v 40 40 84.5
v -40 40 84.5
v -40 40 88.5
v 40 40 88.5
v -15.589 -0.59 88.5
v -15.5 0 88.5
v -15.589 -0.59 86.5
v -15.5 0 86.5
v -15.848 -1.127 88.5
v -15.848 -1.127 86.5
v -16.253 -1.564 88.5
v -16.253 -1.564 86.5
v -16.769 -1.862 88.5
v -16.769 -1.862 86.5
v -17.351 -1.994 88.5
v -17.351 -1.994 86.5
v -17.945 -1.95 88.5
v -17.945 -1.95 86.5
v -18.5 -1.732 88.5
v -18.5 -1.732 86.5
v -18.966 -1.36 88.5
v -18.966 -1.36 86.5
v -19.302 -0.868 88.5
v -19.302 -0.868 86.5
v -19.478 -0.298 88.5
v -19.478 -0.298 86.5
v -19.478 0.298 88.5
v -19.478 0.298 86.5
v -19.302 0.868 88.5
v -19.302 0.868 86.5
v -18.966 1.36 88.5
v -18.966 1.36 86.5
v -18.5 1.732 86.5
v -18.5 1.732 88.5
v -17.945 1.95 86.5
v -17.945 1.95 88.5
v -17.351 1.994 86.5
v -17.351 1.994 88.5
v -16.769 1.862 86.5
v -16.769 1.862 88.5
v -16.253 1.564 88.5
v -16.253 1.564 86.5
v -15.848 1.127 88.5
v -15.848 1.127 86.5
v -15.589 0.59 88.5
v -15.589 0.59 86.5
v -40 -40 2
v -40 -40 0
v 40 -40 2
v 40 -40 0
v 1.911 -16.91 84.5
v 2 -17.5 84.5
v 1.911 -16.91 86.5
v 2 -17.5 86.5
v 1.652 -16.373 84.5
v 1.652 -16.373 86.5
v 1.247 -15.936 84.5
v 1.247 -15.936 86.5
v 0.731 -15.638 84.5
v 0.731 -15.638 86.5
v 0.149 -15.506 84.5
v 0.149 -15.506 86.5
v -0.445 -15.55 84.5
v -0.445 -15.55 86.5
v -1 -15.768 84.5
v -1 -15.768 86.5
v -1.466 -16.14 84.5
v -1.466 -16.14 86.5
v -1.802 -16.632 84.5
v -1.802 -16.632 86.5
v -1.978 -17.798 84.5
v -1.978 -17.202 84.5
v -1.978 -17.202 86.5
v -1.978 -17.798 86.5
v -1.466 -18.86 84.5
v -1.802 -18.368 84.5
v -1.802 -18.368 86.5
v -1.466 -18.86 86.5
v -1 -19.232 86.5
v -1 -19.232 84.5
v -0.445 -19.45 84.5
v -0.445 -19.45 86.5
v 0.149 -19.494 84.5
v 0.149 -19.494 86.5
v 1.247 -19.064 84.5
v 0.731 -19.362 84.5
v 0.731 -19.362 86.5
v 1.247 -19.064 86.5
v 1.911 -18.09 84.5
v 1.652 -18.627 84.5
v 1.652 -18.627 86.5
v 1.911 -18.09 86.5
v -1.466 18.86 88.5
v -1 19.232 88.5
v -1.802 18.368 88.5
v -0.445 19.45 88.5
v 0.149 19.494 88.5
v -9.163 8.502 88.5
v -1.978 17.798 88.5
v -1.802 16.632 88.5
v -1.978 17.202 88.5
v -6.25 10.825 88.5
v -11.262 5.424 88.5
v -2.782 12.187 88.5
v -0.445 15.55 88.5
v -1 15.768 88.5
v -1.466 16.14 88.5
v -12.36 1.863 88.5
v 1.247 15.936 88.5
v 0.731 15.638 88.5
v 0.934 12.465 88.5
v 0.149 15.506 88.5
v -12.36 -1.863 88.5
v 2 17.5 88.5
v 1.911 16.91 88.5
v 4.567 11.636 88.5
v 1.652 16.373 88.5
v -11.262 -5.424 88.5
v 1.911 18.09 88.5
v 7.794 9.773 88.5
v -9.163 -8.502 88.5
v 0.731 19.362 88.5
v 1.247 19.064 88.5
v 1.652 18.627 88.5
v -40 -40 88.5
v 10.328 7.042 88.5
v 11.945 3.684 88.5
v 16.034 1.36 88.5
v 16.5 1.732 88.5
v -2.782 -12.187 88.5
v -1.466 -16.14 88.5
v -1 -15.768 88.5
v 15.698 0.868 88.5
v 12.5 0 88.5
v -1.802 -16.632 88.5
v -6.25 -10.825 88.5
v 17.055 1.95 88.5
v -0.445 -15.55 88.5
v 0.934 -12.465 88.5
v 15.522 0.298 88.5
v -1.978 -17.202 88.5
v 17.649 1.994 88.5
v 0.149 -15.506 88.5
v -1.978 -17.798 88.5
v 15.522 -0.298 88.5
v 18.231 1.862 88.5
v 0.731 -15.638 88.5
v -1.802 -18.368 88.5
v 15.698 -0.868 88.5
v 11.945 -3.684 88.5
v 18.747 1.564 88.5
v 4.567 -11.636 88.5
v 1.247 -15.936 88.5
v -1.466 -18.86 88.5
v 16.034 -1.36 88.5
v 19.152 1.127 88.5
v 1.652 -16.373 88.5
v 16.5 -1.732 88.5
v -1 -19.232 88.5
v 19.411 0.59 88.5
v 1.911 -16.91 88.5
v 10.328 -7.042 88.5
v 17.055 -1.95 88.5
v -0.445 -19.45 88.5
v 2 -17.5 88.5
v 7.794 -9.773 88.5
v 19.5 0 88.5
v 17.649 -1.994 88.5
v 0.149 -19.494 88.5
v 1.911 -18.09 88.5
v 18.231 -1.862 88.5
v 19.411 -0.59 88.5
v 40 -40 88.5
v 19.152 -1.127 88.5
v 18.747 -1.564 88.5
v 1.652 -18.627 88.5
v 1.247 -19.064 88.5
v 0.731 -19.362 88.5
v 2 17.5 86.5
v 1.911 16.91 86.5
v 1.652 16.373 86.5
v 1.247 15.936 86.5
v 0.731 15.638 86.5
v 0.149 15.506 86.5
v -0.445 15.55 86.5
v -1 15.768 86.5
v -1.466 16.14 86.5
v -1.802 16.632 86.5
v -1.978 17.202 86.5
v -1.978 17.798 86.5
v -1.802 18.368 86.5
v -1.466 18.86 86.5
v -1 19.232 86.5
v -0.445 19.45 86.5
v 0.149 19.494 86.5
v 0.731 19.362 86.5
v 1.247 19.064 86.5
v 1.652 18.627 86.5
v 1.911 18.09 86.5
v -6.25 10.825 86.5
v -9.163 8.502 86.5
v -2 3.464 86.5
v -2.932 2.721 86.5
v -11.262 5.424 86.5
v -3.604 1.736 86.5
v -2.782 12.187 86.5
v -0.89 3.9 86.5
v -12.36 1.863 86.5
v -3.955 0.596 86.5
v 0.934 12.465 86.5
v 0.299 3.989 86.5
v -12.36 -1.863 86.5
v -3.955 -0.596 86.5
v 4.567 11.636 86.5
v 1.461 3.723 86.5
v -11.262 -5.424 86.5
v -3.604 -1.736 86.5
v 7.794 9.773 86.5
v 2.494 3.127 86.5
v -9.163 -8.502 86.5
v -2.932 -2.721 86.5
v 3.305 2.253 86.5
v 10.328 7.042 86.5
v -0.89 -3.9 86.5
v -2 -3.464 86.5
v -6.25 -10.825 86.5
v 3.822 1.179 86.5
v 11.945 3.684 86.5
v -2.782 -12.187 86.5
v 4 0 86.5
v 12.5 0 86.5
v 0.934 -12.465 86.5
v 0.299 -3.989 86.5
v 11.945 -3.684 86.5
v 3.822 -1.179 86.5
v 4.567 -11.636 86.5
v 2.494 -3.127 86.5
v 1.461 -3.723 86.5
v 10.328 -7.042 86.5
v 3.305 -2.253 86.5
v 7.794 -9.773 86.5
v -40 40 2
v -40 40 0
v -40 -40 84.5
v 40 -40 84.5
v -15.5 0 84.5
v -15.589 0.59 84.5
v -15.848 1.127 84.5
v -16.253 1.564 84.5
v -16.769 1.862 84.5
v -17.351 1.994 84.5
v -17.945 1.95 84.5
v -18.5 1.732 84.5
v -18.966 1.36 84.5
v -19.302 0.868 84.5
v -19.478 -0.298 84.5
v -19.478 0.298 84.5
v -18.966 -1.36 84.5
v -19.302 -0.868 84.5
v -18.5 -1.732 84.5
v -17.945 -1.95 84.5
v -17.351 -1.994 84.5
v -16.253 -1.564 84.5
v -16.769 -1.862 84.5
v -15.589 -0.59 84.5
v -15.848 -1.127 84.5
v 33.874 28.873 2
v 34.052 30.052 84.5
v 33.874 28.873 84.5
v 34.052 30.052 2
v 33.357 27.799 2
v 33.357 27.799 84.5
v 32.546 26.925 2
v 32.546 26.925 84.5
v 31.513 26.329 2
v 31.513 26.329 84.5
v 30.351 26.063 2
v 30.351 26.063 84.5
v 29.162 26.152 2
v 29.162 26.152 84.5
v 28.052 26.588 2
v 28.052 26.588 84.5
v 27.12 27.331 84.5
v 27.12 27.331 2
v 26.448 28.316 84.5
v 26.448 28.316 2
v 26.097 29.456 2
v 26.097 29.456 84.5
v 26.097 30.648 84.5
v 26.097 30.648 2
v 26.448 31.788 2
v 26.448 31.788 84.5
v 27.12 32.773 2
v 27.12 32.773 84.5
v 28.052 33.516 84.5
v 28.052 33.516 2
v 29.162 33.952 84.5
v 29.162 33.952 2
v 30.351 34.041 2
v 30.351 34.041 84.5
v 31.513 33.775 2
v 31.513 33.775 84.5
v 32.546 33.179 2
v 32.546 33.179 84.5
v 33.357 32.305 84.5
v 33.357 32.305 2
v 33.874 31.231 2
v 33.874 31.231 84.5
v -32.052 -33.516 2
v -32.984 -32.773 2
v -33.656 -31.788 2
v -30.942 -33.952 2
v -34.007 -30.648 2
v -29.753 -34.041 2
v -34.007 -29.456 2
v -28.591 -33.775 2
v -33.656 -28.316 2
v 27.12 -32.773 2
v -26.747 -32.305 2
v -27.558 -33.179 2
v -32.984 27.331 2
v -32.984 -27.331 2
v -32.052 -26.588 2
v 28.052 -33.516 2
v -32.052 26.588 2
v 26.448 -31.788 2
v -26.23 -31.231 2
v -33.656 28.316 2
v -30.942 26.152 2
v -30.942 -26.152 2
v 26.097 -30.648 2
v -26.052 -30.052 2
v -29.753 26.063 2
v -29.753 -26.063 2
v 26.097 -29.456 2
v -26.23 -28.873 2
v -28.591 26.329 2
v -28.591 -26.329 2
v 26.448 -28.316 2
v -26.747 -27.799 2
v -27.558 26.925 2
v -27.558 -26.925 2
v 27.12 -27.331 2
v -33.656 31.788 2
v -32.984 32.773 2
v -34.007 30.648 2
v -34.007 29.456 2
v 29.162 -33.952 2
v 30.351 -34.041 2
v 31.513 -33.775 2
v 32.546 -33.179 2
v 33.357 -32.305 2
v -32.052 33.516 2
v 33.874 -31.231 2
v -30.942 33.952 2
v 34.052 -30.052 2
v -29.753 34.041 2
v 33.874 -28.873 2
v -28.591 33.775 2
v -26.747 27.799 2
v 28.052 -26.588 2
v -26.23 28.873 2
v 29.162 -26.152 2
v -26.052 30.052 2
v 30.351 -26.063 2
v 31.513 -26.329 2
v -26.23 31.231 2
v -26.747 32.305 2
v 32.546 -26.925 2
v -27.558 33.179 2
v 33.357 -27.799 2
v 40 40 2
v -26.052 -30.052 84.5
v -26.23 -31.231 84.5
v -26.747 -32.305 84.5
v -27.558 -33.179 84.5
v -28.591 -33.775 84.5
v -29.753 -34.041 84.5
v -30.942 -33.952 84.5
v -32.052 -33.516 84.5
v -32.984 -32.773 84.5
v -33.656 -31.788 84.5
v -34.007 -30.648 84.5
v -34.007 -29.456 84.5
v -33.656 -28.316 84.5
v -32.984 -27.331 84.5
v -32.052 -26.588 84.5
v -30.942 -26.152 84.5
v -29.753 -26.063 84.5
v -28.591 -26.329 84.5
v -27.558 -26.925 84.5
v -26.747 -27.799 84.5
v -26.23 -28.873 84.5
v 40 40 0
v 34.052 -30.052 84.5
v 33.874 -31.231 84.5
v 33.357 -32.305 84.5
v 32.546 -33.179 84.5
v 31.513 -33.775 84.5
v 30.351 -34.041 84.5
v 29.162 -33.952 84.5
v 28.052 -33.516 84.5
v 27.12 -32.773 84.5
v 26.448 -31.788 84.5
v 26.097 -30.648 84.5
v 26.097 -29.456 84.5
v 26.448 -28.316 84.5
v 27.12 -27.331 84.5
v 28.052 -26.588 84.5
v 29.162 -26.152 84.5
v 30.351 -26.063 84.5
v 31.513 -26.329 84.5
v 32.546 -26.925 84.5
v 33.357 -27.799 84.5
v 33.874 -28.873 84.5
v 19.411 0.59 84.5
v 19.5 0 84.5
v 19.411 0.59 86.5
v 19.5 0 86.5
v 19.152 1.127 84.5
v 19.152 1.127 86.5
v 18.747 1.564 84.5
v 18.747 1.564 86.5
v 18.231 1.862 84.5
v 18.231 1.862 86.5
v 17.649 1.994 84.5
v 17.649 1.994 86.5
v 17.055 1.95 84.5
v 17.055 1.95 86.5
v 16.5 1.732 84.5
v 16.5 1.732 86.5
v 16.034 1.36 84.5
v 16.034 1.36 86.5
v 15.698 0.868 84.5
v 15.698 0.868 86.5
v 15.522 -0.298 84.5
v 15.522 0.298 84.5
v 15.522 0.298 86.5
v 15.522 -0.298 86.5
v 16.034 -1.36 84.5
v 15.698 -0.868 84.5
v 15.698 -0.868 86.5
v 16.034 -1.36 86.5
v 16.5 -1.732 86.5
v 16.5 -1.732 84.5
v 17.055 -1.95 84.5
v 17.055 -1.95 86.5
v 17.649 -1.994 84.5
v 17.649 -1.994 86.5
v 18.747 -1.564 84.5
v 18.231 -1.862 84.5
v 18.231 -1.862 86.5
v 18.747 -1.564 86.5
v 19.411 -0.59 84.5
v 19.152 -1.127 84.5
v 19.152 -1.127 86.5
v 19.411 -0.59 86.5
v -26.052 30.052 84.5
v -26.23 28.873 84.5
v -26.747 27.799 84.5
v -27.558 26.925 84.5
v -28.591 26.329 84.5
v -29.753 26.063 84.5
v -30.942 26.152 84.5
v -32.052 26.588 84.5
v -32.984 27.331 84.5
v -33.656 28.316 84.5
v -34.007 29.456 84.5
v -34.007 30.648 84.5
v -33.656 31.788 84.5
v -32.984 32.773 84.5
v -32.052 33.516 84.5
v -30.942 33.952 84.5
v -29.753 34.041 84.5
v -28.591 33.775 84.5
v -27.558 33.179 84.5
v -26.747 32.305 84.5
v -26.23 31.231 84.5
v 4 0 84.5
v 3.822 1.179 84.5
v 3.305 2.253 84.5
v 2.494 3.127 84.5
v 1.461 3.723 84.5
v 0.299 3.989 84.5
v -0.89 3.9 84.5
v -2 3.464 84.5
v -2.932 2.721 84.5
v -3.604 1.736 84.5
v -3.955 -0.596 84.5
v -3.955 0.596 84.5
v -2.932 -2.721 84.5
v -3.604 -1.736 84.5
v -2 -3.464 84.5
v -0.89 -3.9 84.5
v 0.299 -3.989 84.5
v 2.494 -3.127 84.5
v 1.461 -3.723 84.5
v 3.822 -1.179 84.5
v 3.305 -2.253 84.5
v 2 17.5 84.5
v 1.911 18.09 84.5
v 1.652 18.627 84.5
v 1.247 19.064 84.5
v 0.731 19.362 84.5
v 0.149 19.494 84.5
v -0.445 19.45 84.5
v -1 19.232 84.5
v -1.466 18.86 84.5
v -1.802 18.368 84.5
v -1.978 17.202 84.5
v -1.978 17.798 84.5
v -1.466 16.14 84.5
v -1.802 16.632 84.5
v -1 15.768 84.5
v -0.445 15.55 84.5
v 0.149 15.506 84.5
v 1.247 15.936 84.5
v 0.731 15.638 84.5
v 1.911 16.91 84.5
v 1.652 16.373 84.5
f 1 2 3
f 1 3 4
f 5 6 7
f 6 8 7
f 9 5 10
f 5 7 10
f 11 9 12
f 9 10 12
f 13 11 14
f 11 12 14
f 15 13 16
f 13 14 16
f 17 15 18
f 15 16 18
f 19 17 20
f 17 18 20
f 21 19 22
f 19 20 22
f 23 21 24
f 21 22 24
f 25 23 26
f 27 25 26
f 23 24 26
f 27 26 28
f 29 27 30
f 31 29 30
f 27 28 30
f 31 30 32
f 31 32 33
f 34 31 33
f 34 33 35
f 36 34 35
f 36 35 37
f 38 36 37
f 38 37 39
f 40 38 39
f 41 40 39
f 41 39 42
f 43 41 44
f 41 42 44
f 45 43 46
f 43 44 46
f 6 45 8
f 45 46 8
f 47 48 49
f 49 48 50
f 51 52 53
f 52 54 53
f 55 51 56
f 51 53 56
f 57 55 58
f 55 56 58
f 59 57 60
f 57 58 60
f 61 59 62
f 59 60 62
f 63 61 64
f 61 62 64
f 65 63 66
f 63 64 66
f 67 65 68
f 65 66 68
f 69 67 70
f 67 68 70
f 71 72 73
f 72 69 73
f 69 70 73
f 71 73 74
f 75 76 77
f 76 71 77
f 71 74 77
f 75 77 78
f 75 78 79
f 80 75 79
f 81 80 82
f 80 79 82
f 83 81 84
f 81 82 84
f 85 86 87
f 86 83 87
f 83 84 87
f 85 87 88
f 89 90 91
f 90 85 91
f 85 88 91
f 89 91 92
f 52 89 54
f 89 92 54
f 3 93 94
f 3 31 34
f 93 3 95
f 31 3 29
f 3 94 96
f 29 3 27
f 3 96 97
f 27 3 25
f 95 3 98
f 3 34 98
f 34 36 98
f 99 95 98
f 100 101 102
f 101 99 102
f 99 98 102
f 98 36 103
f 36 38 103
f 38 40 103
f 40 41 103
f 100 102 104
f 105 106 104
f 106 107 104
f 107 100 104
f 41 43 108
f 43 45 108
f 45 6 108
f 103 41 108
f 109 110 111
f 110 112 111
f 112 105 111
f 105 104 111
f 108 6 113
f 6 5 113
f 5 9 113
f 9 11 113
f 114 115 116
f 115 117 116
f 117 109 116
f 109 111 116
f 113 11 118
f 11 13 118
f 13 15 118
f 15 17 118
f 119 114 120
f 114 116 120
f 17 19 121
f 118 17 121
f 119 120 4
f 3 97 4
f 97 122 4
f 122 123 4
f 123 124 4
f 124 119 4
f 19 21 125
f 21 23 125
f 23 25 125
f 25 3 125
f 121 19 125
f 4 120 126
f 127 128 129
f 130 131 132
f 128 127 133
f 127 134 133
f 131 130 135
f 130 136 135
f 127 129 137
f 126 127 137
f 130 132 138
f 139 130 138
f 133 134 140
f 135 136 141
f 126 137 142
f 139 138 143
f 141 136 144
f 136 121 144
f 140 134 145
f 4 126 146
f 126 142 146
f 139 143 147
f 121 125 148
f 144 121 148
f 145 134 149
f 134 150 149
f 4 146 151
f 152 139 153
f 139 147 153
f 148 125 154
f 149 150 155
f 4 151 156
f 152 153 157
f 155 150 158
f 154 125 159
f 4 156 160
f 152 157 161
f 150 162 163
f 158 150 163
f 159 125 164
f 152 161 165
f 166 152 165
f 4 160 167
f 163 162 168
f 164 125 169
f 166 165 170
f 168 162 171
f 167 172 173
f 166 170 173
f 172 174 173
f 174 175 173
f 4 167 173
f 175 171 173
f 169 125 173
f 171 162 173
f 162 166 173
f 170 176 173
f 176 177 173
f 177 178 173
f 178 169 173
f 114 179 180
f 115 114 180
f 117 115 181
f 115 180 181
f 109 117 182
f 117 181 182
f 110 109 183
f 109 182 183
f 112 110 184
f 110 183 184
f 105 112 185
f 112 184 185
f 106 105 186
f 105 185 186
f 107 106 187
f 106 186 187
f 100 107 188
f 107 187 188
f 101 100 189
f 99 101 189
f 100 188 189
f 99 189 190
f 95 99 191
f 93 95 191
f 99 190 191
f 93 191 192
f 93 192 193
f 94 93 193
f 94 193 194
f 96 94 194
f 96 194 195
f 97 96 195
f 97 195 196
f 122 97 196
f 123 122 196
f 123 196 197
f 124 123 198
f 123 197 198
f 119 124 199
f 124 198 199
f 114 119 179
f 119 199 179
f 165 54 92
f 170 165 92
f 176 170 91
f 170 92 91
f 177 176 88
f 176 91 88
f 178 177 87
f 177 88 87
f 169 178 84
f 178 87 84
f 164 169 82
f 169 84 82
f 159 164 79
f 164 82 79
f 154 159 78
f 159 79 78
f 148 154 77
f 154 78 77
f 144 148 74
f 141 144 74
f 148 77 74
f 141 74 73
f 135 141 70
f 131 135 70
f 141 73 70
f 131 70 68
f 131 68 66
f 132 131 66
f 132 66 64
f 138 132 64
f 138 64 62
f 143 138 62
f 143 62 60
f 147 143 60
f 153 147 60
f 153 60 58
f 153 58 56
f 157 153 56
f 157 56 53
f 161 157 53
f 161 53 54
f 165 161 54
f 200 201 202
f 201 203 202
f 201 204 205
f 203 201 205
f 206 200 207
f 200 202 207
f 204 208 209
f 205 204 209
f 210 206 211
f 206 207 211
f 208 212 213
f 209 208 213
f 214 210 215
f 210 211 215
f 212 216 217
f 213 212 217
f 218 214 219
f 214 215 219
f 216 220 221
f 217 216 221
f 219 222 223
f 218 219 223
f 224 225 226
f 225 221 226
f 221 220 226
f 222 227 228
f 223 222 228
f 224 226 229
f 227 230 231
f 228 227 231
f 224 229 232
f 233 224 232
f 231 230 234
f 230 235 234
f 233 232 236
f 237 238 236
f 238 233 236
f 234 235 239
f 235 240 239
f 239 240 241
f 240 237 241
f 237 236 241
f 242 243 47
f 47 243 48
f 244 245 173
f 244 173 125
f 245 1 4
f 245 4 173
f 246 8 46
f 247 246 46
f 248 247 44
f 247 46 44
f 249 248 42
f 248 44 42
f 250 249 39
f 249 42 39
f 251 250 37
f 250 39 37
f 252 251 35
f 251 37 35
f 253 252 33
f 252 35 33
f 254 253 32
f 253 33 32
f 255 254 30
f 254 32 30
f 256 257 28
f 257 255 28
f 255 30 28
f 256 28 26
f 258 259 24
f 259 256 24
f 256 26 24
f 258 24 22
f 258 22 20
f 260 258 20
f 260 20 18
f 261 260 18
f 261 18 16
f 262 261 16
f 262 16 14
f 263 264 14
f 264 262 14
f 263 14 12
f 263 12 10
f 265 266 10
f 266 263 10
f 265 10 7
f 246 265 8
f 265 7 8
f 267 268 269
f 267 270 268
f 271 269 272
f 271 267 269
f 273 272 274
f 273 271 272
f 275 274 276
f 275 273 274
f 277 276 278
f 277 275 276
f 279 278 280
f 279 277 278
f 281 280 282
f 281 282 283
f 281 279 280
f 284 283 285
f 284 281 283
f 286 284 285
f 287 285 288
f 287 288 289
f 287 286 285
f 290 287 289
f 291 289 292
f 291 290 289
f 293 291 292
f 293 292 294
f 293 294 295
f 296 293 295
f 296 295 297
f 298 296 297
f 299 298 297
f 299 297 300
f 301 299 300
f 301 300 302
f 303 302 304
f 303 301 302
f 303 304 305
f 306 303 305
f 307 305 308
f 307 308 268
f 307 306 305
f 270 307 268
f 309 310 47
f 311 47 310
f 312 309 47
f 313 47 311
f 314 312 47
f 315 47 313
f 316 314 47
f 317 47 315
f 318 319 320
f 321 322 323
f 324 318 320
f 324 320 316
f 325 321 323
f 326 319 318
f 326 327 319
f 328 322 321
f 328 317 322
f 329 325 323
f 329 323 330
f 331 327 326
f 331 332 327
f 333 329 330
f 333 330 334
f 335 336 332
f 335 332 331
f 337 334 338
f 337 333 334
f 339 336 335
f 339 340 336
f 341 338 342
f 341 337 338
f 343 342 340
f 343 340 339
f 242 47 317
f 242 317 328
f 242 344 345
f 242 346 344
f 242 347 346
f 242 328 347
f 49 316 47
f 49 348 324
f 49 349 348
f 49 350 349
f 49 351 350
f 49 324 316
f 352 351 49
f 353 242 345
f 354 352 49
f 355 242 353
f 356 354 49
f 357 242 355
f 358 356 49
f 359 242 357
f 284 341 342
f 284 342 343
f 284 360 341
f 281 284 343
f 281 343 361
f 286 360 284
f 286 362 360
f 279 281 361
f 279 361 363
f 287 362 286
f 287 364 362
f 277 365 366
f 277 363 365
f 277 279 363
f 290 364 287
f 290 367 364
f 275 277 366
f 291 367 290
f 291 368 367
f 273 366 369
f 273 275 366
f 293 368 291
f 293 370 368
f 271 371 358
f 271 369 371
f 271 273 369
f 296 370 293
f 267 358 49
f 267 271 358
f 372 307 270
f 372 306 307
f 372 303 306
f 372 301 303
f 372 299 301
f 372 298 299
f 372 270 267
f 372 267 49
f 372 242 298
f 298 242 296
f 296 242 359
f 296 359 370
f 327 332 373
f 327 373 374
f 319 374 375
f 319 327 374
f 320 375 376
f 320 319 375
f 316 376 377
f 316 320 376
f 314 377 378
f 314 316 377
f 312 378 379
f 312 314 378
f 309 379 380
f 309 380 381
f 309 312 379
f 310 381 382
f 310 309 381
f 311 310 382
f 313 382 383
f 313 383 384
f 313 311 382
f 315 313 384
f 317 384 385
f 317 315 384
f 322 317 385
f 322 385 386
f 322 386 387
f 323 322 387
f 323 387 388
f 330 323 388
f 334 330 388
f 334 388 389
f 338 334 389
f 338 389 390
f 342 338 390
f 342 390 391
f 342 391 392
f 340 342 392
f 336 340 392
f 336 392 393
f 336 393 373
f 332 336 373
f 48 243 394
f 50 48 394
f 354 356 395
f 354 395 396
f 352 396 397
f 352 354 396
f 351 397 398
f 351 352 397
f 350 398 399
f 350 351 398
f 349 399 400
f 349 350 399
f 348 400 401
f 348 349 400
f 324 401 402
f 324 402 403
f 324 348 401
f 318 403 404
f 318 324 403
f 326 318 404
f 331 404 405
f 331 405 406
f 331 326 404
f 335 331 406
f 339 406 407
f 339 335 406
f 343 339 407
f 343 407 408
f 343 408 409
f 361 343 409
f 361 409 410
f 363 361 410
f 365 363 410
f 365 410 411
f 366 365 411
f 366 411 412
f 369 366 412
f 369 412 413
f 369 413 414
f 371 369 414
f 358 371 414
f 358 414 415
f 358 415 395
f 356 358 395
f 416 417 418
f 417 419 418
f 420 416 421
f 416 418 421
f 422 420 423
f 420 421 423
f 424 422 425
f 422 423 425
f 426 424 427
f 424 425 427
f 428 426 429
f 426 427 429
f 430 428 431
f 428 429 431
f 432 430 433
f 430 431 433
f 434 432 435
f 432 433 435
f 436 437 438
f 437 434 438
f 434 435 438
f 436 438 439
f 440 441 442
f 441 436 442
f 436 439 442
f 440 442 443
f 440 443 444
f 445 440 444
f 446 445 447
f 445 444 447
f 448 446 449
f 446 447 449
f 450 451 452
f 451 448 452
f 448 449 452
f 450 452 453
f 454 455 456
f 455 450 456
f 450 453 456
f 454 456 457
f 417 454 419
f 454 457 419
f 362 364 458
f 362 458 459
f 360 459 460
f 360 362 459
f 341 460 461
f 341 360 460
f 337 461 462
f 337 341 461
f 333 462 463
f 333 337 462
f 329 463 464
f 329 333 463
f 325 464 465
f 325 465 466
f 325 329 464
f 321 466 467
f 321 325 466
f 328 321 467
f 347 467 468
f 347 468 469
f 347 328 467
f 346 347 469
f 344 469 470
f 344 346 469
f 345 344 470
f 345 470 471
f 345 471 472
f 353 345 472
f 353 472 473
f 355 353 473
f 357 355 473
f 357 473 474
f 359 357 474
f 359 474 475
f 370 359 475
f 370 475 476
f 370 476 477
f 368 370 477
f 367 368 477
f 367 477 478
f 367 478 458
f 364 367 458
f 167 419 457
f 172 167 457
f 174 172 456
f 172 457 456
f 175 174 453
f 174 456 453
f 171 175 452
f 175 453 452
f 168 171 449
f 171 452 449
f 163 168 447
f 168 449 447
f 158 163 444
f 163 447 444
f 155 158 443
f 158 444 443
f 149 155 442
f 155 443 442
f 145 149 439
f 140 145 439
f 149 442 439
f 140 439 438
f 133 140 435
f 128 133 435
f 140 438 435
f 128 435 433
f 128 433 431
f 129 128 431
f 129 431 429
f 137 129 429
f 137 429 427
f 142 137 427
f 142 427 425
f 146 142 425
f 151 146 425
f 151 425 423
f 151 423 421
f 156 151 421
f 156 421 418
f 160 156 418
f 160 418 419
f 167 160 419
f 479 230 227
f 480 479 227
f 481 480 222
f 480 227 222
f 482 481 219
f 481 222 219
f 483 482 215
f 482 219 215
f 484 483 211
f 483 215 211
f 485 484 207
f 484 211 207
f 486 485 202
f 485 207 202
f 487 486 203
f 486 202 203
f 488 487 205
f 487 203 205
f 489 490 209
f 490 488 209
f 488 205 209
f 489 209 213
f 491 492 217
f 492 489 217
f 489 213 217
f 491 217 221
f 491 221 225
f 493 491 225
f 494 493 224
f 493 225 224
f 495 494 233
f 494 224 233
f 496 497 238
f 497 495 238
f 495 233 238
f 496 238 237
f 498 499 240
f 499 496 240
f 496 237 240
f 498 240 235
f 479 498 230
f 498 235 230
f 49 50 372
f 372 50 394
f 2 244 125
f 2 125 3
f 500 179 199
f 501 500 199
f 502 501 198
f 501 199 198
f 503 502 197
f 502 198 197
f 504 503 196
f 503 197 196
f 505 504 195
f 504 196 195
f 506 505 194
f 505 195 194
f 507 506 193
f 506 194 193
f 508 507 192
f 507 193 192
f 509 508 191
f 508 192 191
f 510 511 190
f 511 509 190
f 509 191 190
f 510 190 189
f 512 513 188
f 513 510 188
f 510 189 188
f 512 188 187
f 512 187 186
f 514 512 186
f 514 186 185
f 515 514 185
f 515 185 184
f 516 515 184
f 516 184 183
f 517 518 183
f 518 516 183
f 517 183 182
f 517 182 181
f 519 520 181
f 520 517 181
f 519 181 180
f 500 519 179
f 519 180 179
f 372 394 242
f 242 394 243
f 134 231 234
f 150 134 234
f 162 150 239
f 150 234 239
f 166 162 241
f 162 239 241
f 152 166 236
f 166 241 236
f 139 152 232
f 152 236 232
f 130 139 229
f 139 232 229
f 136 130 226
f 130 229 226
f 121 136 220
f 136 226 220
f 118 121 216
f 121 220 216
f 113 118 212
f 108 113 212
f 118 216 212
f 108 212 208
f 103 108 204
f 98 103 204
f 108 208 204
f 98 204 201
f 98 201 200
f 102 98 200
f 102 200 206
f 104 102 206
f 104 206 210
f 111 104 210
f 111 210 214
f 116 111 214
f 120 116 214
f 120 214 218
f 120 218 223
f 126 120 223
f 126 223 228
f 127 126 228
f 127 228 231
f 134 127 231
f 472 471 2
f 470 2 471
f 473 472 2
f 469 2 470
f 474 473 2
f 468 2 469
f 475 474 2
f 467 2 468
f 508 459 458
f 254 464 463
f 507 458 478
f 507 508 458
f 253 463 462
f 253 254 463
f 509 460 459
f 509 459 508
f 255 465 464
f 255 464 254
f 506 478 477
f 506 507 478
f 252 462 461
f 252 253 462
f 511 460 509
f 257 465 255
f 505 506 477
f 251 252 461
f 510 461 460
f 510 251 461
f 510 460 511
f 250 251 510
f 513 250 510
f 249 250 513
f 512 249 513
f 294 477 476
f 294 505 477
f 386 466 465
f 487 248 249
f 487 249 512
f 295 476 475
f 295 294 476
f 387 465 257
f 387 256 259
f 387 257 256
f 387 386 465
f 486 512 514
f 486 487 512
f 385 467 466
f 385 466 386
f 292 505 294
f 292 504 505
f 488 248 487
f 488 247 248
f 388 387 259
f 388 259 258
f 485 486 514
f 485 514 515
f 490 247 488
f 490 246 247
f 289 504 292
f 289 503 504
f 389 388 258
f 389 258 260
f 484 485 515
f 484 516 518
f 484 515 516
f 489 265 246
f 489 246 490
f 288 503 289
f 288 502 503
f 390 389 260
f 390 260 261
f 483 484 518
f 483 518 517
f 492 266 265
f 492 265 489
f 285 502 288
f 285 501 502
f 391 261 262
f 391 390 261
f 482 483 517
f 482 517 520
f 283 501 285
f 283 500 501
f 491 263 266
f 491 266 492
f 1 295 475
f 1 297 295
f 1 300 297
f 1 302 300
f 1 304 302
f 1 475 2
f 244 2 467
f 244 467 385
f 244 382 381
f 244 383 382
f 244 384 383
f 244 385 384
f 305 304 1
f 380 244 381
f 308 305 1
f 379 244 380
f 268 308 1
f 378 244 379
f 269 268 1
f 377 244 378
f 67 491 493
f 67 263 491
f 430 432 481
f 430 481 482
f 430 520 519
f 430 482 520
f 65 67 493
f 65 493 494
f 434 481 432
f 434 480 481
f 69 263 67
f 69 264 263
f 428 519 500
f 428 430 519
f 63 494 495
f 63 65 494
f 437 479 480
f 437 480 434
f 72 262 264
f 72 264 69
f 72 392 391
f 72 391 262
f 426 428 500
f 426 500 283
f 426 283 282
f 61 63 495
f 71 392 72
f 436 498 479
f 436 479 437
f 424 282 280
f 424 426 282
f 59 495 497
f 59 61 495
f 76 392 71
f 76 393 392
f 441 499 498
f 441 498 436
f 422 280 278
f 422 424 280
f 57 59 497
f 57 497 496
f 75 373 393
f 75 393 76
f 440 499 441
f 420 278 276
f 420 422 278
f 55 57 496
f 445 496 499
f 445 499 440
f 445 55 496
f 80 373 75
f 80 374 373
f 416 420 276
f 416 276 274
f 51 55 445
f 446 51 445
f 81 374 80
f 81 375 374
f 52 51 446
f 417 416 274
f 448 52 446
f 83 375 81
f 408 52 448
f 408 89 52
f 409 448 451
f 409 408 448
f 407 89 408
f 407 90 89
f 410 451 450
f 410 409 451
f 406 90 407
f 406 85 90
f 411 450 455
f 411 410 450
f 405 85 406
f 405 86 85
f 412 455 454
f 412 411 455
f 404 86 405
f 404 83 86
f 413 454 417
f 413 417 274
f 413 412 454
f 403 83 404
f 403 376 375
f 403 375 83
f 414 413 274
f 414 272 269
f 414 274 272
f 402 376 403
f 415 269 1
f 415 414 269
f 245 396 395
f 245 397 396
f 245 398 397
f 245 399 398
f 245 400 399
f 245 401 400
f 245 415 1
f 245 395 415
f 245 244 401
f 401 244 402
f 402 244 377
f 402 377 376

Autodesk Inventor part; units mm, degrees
ref_plane "YZ Plane" through (0, 0, 0) normal (1, 0, 0) x (0, 1, 0)
ref_plane "XZ Plane" through (0, 0, 0) normal (0, 1, 0) x (-1, 0, 0)
ref_plane "Work Plane1" through (0, 0, 0) normal (0, 0, 1) x (1, 0, 0)
sketch "Sketch1" plane through (0, 0, 0) normal (0, 0, 1) x (1, 0, 0)
  line L0 (-40, -40) -> (40, -40)
  line L1 (40, -40) -> (40, 40)
  line L2 (40, 40) -> (-40, 40)
  line L3 (-40, 40) -> (-40, -40)
  line L4 (-40, -40) -> (40, 40) construction
  line L5 (40, -40) -> (-40, 40) construction
  point P0 (0, 0)
  dimension "d0" = 80
extrude "Extrusion1" add sketch "Sketch1" along normal blind 2
ref_plane "Work Plane2" through (-14.1414, -14.1414, 86.5) normal (0, 0, -1) x (0, 1, 0)
sketch "Sketch2" plane through (0, 0, 2) normal (0, 0, 1) x (1, 0, 0)
  circle A0 centre (0, 0) radius 42.5 construction
  circle A1 centre (30.052, 30.052) radius 4
  line L0 (0, 0) -> (30.052, 30.052) construction
  line L1 (-40, -40) -> (40, -40) projected
  circle A2 centre (-30.052, 30.052) radius 4
  circle A3 centre (-30.052, -30.052) radius 4
  circle A4 centre (30.052, -30.052) radius 4
  dimension "d3" = 85
  dimension "d4" = 45
  dimension "d5" = 8
  dimension "d8" = 360
extrude "Extrusion2" add sketch "Sketch2" along normal up to surface (84.5 mm away)
ref_plane "Work Plane3" through (0, 0, 86.5) normal (0, 0, -1) x (1, 0, 0)
sketch "Sketch3" plane through (0, 0, 86.5) normal (0, 0, -1) x (1, 0, 0)
  line L0 (40, -40) -> (-40, -40) projected
  circle A0 centre (30.052, -30.052) radius 4 projected
  circle A1 centre (-30.052, 30.052) radius 4 projected
  circle A2 centre (30.052, 30.052) radius 4 projected
  circle A3 centre (-30.052, -30.052) radius 4 projected
  line L1 (40, -40) -> (-40, -40) projected
  line L2 (-40, -40) -> (-40, 40) projected
  line L3 (-40, 40) -> (40, 40) projected
  line L4 (40, 40) -> (40, -40) projected
  circle A4 centre (0, 0) radius 12.5 projected
  circle A5 centre (-17.5, 0) radius 2 projected
  circle A6 centre (0, 17.5) radius 2 projected
  circle A7 centre (0, -17.5) radius 2 projected
  circle A8 centre (17.5, 0) radius 2 projected
  circle A9 centre (0, 0) radius 20.85 projected
  circle A10 centre (0, 0) radius 4 projected
  point P0 (0, 0)
  point P1 (40, -40)
  point P2 (-40, -40)
extrude "Extrusion3" add sketch "Sketch3" along normal blind 2 contours L0 L2 L3 L4 | A4 | A9
sketch "Sketch4" plane through (0, 0, 86.5) normal (0, 0, -1) x (1, 0, 0)
  line L0 (40, -40) -> (40, 40) projected
  line L1 (-40, -40) -> (40, -40) projected
  line L2 (-40, 40) -> (-40, -40) projected
  line L3 (40, 40) -> (-40, 40) projected
  circle A0 centre (0, 0) radius 12.5 projected
  line L4 (40, -40) -> (40, 40) projected
  line L5 (-40, -40) -> (40, -40) projected
  line L6 (-40, 40) -> (-40, -40) projected
  line L7 (40, 40) -> (-40, 40) projected
  circle A1 centre (0, 0) radius 4 projected
  circle A2 centre (0, 17.5) radius 2 projected
  circle A3 centre (0, -17.5) radius 2 projected
  circle A4 centre (-17.5, 0) radius 2 projected
  circle A5 centre (17.5, 0) radius 2 projected
  point P0 (0, 0)
extrude "Extrusion4" add sketch "Sketch4" against normal blind 2 contours L1 L2 L3 L0
properties part number "motor to gearbox flange"
